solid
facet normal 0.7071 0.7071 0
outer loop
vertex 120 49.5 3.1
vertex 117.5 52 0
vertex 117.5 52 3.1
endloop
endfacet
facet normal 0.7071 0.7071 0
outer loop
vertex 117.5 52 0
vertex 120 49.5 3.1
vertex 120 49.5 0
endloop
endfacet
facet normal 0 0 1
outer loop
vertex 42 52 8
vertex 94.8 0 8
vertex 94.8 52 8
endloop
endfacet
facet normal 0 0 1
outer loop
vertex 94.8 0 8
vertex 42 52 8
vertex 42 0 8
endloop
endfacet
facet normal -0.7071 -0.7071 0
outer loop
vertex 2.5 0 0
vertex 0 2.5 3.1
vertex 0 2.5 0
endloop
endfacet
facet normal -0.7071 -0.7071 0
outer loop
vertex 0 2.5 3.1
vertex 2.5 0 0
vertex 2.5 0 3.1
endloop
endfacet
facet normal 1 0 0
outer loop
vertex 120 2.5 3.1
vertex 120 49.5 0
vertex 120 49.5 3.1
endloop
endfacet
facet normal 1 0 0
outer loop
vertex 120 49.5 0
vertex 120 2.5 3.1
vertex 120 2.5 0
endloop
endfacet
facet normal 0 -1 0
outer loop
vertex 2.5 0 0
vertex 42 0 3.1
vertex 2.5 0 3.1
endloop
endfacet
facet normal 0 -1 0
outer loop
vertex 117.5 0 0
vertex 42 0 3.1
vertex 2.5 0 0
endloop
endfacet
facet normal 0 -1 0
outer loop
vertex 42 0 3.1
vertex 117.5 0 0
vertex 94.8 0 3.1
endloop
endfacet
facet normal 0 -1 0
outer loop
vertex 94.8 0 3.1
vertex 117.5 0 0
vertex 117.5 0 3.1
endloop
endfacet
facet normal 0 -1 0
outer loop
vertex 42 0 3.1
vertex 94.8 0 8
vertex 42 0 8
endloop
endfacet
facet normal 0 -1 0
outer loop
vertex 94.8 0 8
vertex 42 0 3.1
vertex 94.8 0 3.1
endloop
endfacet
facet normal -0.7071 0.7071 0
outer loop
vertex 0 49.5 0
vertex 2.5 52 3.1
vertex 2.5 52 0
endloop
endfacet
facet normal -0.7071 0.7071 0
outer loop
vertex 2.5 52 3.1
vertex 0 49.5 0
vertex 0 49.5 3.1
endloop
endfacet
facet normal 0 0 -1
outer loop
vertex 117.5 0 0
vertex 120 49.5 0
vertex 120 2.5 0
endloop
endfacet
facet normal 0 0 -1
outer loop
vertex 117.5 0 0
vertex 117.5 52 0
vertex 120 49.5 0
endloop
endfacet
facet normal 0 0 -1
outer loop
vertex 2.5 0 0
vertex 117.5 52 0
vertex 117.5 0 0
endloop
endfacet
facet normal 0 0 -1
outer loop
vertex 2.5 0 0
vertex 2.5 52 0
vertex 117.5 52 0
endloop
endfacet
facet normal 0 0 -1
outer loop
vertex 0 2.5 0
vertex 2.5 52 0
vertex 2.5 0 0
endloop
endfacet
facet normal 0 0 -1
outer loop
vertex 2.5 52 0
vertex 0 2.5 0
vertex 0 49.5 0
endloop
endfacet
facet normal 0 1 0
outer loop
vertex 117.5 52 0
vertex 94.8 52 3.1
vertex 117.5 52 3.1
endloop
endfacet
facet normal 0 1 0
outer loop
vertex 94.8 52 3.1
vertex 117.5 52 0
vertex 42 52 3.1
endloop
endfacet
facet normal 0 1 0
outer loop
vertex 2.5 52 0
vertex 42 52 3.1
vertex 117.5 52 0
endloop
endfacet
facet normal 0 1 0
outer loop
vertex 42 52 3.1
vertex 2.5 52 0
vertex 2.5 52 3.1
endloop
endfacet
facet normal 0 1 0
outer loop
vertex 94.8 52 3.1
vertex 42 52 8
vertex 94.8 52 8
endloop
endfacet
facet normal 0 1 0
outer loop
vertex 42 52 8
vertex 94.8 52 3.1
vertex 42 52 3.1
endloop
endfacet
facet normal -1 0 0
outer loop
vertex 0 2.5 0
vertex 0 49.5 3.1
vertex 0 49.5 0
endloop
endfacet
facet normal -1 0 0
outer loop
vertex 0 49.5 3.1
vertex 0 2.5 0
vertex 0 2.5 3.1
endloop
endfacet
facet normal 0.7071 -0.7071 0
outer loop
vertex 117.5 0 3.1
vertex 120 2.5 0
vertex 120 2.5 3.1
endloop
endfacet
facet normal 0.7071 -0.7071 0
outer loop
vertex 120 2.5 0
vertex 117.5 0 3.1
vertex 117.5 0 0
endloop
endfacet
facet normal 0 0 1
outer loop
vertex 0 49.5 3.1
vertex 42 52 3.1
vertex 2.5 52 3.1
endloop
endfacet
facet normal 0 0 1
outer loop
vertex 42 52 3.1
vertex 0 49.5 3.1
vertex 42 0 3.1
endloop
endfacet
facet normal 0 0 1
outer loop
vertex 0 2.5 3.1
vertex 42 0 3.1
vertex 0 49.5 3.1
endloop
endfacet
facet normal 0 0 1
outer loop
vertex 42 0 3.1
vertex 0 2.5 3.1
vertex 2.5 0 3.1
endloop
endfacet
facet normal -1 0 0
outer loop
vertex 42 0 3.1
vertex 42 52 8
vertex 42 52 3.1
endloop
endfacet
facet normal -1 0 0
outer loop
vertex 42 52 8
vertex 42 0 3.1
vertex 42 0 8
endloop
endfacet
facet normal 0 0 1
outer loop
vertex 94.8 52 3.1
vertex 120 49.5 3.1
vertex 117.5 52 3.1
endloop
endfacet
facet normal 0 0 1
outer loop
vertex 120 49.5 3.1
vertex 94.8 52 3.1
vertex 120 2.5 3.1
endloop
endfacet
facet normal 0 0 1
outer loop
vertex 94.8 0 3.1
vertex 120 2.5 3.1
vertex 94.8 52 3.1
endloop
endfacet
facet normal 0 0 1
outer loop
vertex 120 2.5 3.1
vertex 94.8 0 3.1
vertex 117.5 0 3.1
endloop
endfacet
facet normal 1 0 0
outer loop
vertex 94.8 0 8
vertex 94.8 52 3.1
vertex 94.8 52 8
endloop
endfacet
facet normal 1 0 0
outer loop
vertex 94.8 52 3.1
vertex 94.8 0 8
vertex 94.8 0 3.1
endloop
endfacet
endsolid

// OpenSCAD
$fn = 32;

// ----------------------------------------------------------------------
// Stepped bar: centerstep, 120 x 52 x 8/3.1 mm
// ----------------------------------------------------------------------

// --- parameters (mm) ---
bar_l = 120;              // bar length, X
bar_w = 52;               // bar width, Y
plate_t = 8;              // thickness of the thick zone, Z
thin_t = 3.1;             // thickness of the thin zone
corner_c = 2.5;           // corner chamfer of the bar
step_cut = 4.9;           // material removed from the thin zone
thick_from = 42;          // start of the thick middle zone
thick_to = 94.8;          // end of the thick middle zone
depth_1 = 4.9;            // depth of cut 1 from the top face
depth_2 = 4.9;            // depth of cut 2 from the top face

profile = [[2.5, 0], [117.5, 0], [120, 2.5], [120, 49.5], [117.5, 52], [2.5, 52], [0, 49.5], [0, 2.5]];  // primary outline, 8 points, counter clockwise
void_1 = [[-1, -1], [42, -1], [42, 53], [-1, 53]];  // thin left end, 4 points
void_2 = [[94.8, -1], [121, -1], [121, 53], [94.8, 53]];  // thin right end, 4 points

// --- the one profile operation ---
difference() {
  linear_extrude(height = plate_t) polygon(points = profile);
  translate([0, 0, plate_t - depth_1])
    linear_extrude(height = depth_1 + 1) polygon(points = void_1);
  translate([0, 0, plate_t - depth_2])
    linear_extrude(height = depth_2 + 1) polygon(points = void_2);
}
